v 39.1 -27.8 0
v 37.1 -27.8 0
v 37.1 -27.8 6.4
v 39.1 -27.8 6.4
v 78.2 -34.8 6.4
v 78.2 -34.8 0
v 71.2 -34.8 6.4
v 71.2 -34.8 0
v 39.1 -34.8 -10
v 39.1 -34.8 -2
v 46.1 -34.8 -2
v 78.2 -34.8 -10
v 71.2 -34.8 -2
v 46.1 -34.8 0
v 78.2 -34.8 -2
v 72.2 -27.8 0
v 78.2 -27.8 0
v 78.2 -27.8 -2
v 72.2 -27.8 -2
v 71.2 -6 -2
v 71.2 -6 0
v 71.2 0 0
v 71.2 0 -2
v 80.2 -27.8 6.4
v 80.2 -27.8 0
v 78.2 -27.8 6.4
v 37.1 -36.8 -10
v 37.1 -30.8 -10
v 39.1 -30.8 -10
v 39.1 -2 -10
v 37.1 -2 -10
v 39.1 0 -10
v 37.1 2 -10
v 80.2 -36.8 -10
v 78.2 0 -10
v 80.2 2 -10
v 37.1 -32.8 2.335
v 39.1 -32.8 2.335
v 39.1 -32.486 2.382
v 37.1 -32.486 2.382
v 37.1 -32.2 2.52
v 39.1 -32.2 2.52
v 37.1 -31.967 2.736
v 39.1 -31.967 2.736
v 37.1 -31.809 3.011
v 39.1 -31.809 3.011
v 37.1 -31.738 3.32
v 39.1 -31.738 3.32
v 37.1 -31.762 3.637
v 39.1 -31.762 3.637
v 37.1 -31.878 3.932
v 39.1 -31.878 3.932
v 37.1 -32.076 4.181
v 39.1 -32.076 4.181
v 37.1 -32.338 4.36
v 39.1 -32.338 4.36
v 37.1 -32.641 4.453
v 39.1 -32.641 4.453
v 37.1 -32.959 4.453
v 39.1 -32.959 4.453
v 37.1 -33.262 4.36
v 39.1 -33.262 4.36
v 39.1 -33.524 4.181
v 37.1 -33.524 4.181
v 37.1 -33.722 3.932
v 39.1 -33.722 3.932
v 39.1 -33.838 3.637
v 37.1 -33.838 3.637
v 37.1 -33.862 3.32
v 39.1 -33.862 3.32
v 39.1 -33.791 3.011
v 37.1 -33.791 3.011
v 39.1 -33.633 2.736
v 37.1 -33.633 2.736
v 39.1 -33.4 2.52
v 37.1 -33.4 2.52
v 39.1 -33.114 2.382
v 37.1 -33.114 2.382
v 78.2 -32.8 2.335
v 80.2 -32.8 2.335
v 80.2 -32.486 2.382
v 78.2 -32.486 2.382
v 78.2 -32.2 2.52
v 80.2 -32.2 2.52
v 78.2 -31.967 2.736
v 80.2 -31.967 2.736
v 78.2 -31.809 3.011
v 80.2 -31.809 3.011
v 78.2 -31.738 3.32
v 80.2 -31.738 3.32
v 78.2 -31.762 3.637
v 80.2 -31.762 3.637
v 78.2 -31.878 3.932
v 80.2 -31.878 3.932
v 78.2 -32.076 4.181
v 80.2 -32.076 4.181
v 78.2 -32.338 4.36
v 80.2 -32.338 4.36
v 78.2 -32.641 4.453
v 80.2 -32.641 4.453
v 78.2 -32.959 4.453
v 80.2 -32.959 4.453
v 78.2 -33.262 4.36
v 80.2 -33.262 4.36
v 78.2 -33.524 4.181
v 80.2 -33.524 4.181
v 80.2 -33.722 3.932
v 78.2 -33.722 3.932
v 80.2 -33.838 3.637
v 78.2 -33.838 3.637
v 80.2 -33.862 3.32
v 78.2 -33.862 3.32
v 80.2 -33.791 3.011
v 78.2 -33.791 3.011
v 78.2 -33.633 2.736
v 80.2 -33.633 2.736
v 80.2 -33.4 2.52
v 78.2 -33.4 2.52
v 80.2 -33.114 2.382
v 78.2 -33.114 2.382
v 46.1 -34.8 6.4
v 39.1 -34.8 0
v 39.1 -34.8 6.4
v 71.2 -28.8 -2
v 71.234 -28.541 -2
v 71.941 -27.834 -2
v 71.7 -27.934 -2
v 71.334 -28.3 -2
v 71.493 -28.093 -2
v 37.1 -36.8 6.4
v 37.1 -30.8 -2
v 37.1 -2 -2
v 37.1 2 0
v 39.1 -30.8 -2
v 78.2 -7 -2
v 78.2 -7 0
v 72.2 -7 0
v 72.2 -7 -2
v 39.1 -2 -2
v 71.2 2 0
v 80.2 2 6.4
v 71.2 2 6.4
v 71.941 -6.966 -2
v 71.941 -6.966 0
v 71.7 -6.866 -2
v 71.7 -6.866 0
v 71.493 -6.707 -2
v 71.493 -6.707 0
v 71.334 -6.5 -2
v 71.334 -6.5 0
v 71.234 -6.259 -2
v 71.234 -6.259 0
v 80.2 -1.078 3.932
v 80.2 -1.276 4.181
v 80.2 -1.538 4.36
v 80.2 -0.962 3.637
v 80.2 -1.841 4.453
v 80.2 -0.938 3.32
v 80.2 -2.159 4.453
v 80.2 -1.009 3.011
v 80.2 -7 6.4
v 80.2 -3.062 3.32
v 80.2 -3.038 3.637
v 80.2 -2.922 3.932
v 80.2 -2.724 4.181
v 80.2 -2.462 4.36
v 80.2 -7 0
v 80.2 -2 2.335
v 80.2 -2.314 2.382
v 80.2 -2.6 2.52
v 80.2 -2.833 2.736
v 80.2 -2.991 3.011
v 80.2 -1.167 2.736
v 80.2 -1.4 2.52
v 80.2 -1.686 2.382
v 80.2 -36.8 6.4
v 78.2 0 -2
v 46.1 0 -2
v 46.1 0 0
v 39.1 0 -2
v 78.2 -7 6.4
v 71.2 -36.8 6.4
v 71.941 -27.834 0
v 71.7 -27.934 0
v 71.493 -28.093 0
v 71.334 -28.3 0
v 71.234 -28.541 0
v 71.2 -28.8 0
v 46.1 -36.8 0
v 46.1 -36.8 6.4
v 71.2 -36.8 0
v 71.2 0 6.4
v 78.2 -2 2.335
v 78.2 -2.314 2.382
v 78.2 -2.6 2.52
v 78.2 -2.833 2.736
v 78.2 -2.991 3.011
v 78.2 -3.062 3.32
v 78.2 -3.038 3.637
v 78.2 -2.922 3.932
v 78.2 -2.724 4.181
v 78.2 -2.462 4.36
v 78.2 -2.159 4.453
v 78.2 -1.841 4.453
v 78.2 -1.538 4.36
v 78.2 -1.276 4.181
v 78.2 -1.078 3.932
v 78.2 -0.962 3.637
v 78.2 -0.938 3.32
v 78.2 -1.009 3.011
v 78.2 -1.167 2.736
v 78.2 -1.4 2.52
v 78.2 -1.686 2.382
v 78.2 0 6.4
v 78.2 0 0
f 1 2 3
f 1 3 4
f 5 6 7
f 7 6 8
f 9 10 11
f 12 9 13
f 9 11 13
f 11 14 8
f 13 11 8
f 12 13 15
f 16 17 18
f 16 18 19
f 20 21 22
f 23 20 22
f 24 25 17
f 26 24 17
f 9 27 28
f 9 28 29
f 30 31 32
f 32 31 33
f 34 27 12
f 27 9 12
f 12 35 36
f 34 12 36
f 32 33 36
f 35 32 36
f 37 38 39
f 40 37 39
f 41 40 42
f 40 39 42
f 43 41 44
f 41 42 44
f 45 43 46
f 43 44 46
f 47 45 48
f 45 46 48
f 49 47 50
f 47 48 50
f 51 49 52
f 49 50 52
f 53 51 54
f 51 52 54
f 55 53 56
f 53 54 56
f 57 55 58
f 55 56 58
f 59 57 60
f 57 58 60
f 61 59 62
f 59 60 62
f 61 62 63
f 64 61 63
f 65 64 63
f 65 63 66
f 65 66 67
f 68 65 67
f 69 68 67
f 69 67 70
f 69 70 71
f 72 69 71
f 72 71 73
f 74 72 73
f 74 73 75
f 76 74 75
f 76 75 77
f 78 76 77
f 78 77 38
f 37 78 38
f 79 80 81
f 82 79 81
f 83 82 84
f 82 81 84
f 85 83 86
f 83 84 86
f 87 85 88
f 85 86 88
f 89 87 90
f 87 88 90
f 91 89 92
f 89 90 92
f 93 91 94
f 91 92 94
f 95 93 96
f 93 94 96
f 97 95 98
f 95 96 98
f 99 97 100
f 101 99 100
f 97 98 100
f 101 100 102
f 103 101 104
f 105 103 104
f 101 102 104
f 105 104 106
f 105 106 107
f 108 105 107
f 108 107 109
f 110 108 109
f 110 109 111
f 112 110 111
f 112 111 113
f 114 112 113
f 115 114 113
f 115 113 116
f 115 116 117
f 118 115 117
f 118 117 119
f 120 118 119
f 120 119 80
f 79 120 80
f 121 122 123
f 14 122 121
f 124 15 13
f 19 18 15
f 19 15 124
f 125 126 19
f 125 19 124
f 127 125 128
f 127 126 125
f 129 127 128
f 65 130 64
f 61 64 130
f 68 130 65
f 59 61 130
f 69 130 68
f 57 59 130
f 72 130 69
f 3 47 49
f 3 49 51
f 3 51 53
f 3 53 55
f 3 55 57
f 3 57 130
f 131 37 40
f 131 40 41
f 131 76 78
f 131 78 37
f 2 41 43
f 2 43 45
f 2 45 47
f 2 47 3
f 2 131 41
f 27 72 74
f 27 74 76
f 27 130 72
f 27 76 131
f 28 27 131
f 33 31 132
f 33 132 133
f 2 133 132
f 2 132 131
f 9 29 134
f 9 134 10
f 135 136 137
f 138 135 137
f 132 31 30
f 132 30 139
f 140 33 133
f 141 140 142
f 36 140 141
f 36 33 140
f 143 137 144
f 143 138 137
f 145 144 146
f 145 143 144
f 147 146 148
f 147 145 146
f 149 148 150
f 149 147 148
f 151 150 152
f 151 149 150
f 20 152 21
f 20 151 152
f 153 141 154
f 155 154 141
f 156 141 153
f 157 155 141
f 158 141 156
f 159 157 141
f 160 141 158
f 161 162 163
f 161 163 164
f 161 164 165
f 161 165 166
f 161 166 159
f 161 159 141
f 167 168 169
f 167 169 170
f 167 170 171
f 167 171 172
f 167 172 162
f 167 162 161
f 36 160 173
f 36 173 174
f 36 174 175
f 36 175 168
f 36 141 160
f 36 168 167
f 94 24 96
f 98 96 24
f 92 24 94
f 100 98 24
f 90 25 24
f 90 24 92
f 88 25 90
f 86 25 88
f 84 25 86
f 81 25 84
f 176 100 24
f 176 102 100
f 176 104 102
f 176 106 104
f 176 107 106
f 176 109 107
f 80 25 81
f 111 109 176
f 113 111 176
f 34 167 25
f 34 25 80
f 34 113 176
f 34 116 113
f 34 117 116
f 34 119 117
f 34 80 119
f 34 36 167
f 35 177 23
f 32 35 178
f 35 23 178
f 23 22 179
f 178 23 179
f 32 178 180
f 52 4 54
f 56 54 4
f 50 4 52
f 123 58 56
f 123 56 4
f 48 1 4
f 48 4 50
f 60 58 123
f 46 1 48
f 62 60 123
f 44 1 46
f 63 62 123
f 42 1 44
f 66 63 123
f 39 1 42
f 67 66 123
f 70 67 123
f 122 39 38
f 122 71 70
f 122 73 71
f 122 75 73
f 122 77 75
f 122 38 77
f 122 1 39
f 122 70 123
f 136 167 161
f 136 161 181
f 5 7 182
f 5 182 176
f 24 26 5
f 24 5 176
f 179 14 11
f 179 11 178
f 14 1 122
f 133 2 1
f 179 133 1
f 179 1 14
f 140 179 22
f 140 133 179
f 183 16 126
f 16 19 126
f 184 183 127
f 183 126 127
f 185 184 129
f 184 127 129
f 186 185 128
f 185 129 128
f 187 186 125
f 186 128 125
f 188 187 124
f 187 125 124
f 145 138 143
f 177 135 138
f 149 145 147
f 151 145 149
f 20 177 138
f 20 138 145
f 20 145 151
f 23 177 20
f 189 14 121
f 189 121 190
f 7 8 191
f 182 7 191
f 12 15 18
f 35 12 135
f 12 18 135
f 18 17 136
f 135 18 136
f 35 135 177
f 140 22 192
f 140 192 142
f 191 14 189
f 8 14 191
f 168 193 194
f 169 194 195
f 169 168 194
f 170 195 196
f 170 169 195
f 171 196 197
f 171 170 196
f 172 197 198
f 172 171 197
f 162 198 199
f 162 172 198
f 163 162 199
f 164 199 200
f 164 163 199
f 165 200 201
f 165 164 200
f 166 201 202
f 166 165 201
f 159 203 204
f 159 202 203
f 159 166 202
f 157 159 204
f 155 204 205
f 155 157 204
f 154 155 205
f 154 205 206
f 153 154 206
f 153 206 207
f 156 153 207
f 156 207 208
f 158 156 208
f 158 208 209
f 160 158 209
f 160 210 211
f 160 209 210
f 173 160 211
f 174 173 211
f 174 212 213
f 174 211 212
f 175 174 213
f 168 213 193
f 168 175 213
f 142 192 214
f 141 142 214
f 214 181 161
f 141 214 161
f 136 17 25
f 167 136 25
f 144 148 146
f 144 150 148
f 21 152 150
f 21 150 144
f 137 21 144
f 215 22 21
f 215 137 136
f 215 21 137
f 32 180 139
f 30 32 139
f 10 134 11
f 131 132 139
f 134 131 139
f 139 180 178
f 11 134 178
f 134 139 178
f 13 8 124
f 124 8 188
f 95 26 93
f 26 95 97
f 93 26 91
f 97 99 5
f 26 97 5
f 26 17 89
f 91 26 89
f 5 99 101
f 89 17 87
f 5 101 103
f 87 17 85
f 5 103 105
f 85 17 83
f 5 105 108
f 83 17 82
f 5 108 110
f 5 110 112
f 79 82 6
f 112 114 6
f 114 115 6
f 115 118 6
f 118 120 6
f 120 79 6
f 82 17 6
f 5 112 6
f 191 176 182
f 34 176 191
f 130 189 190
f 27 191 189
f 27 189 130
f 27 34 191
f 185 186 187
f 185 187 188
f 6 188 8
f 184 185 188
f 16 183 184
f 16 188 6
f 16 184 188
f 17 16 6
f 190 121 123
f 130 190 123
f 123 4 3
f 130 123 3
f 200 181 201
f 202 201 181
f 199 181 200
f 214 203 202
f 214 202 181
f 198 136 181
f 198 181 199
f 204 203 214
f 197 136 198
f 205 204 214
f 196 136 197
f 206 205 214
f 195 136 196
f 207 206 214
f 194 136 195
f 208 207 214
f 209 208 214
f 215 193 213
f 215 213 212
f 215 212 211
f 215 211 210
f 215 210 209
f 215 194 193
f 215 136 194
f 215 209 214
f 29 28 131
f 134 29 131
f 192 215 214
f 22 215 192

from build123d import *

# Parameters (mm, degrees)
EXTRUDE_THIN1_DEPTH = 10
SKETCH2_W           = 7
SKETCH2_H           = 7
BOSS_EXTRUDE1_DEPTH = 2
FILLET1_R           = 1
CUT_EXTRUDE1_REACH  = 45.1
SKETCH3_W           = 10
SKETCH3_H           = 28.8
SKETCH4_W           = 9
SKETCH4_H           = 28.8
BOSS_EXTRUDE2_DEPTH = 2
BOSS_EXTRUDE3_DEPTH = 6.4
SKETCH6_R           = 1.065
CUT_EXTRUDE2_DEPTH  = 44.1


with BuildPart() as part:
    # Sketch1 → Extrude-Thin1 (new body)
    with BuildSketch(Plane.XY):
        Polygon((-2, -36.8), (-2, -5), (-2, 2), (41.1, 2), (41.1, -36.8), (34.1, -36.8), align=None)
        Polygon((0, -34.8), (0, -5), (0, 0), (39.1, 0), (39.1, -34.8), (34.1, -34.8), align=None, mode=Mode.SUBTRACT)
    extrude(amount=-EXTRUDE_THIN1_DEPTH)

    # Sketch2 → Boss-Extrude1 (add)
    with BuildSketch(Plane.XY):
        with Locations((3.5, -3.5)):
            Rectangle(SKETCH2_W, SKETCH2_H)
        with Locations((35.6, -3.5)):
            Rectangle(SKETCH2_W, SKETCH2_H)
        with Locations((35.6, -31.3)):
            Rectangle(SKETCH2_W, SKETCH2_H)
        with Locations((3.5, -31.3)):
            Rectangle(SKETCH2_W, SKETCH2_H)
    extrude(amount=-BOSS_EXTRUDE1_DEPTH)

    # Fillet1
    fillet1_edges = [part.edges().sort_by_distance(p)[0] for p in [
        (7, -7, -1),
        (32.1, -7, -1),
        (32.1, -27.8, -1),
        (7, -27.8, -1),
    ]]
    fillet(fillet1_edges, radius=FILLET1_R)


with BuildPart() as body_2:
    # Mirror1: mirrored copy
    add(part.part.mirror(Plane(origin=(39.1, 0, -10), x_dir=(0, 0, 1), z_dir=(1, 0, 0))))

    # Sketch3 → Cut-Extrude1 (cut, up to next)
    with BuildSketch(Plane.ZY.offset(-37.1), mode=Mode.PRIVATE) as cut_extrude1_sk1:
        with Locations((-5, -16.4)):
            Rectangle(SKETCH3_W, SKETCH3_H)
    cut_extrude1_tool1 = extrude(cut_extrude1_sk1.sketch, amount=-CUT_EXTRUDE1_REACH, mode=Mode.PRIVATE) & body_2.part
    add(cut_extrude1_tool1.solids().sort_by_distance((37.1, -16.4, -5))[0], mode=Mode.SUBTRACT)

    # Sketch4 → Boss-Extrude2 (add)
    with BuildSketch(Plane.XY):
        with Locations((41.6, -16.4)):
            Rectangle(SKETCH4_W, SKETCH4_H)
    extrude(amount=-BOSS_EXTRUDE2_DEPTH)

    # Sketch5 → Boss-Extrude3 (add)
    with BuildSketch(Plane.XY):
        Polygon((71.2, -34.8), (71.2, -36.8), (80.2, -36.8), (80.2, -27.8), (78.2, -27.8), (78.2, -34.8), align=None)
    boss_extrude3 = extrude(amount=BOSS_EXTRUDE3_DEPTH)

    # Mirror2: Boss-Extrude3 across plane
    add(boss_extrude3.mirror(Plane.ZX.offset(-17.4)))

    # Mirror3: Boss-Extrude3 across plane
    add(boss_extrude3.mirror(Plane(origin=(58.65, 0, 0), x_dir=(0, 0, 1), z_dir=(1, 0, 0))))

    # Sketch6 → Cut-Extrude2 (cut, through all)
    with BuildSketch(Plane(origin=(80.2, 0, 0), x_dir=(0, 0, -1), z_dir=(1, 0, 0))):
        with Locations((-3.4, -32.8)):
            Circle(SKETCH6_R)
    cut_extrude2 = extrude(amount=-CUT_EXTRUDE2_DEPTH, mode=Mode.SUBTRACT)

    # Mirror4: Cut-Extrude2 across plane
    add(cut_extrude2.mirror(Plane.ZX.offset(-17.4)), mode=Mode.SUBTRACT)


solid = body_2.part
